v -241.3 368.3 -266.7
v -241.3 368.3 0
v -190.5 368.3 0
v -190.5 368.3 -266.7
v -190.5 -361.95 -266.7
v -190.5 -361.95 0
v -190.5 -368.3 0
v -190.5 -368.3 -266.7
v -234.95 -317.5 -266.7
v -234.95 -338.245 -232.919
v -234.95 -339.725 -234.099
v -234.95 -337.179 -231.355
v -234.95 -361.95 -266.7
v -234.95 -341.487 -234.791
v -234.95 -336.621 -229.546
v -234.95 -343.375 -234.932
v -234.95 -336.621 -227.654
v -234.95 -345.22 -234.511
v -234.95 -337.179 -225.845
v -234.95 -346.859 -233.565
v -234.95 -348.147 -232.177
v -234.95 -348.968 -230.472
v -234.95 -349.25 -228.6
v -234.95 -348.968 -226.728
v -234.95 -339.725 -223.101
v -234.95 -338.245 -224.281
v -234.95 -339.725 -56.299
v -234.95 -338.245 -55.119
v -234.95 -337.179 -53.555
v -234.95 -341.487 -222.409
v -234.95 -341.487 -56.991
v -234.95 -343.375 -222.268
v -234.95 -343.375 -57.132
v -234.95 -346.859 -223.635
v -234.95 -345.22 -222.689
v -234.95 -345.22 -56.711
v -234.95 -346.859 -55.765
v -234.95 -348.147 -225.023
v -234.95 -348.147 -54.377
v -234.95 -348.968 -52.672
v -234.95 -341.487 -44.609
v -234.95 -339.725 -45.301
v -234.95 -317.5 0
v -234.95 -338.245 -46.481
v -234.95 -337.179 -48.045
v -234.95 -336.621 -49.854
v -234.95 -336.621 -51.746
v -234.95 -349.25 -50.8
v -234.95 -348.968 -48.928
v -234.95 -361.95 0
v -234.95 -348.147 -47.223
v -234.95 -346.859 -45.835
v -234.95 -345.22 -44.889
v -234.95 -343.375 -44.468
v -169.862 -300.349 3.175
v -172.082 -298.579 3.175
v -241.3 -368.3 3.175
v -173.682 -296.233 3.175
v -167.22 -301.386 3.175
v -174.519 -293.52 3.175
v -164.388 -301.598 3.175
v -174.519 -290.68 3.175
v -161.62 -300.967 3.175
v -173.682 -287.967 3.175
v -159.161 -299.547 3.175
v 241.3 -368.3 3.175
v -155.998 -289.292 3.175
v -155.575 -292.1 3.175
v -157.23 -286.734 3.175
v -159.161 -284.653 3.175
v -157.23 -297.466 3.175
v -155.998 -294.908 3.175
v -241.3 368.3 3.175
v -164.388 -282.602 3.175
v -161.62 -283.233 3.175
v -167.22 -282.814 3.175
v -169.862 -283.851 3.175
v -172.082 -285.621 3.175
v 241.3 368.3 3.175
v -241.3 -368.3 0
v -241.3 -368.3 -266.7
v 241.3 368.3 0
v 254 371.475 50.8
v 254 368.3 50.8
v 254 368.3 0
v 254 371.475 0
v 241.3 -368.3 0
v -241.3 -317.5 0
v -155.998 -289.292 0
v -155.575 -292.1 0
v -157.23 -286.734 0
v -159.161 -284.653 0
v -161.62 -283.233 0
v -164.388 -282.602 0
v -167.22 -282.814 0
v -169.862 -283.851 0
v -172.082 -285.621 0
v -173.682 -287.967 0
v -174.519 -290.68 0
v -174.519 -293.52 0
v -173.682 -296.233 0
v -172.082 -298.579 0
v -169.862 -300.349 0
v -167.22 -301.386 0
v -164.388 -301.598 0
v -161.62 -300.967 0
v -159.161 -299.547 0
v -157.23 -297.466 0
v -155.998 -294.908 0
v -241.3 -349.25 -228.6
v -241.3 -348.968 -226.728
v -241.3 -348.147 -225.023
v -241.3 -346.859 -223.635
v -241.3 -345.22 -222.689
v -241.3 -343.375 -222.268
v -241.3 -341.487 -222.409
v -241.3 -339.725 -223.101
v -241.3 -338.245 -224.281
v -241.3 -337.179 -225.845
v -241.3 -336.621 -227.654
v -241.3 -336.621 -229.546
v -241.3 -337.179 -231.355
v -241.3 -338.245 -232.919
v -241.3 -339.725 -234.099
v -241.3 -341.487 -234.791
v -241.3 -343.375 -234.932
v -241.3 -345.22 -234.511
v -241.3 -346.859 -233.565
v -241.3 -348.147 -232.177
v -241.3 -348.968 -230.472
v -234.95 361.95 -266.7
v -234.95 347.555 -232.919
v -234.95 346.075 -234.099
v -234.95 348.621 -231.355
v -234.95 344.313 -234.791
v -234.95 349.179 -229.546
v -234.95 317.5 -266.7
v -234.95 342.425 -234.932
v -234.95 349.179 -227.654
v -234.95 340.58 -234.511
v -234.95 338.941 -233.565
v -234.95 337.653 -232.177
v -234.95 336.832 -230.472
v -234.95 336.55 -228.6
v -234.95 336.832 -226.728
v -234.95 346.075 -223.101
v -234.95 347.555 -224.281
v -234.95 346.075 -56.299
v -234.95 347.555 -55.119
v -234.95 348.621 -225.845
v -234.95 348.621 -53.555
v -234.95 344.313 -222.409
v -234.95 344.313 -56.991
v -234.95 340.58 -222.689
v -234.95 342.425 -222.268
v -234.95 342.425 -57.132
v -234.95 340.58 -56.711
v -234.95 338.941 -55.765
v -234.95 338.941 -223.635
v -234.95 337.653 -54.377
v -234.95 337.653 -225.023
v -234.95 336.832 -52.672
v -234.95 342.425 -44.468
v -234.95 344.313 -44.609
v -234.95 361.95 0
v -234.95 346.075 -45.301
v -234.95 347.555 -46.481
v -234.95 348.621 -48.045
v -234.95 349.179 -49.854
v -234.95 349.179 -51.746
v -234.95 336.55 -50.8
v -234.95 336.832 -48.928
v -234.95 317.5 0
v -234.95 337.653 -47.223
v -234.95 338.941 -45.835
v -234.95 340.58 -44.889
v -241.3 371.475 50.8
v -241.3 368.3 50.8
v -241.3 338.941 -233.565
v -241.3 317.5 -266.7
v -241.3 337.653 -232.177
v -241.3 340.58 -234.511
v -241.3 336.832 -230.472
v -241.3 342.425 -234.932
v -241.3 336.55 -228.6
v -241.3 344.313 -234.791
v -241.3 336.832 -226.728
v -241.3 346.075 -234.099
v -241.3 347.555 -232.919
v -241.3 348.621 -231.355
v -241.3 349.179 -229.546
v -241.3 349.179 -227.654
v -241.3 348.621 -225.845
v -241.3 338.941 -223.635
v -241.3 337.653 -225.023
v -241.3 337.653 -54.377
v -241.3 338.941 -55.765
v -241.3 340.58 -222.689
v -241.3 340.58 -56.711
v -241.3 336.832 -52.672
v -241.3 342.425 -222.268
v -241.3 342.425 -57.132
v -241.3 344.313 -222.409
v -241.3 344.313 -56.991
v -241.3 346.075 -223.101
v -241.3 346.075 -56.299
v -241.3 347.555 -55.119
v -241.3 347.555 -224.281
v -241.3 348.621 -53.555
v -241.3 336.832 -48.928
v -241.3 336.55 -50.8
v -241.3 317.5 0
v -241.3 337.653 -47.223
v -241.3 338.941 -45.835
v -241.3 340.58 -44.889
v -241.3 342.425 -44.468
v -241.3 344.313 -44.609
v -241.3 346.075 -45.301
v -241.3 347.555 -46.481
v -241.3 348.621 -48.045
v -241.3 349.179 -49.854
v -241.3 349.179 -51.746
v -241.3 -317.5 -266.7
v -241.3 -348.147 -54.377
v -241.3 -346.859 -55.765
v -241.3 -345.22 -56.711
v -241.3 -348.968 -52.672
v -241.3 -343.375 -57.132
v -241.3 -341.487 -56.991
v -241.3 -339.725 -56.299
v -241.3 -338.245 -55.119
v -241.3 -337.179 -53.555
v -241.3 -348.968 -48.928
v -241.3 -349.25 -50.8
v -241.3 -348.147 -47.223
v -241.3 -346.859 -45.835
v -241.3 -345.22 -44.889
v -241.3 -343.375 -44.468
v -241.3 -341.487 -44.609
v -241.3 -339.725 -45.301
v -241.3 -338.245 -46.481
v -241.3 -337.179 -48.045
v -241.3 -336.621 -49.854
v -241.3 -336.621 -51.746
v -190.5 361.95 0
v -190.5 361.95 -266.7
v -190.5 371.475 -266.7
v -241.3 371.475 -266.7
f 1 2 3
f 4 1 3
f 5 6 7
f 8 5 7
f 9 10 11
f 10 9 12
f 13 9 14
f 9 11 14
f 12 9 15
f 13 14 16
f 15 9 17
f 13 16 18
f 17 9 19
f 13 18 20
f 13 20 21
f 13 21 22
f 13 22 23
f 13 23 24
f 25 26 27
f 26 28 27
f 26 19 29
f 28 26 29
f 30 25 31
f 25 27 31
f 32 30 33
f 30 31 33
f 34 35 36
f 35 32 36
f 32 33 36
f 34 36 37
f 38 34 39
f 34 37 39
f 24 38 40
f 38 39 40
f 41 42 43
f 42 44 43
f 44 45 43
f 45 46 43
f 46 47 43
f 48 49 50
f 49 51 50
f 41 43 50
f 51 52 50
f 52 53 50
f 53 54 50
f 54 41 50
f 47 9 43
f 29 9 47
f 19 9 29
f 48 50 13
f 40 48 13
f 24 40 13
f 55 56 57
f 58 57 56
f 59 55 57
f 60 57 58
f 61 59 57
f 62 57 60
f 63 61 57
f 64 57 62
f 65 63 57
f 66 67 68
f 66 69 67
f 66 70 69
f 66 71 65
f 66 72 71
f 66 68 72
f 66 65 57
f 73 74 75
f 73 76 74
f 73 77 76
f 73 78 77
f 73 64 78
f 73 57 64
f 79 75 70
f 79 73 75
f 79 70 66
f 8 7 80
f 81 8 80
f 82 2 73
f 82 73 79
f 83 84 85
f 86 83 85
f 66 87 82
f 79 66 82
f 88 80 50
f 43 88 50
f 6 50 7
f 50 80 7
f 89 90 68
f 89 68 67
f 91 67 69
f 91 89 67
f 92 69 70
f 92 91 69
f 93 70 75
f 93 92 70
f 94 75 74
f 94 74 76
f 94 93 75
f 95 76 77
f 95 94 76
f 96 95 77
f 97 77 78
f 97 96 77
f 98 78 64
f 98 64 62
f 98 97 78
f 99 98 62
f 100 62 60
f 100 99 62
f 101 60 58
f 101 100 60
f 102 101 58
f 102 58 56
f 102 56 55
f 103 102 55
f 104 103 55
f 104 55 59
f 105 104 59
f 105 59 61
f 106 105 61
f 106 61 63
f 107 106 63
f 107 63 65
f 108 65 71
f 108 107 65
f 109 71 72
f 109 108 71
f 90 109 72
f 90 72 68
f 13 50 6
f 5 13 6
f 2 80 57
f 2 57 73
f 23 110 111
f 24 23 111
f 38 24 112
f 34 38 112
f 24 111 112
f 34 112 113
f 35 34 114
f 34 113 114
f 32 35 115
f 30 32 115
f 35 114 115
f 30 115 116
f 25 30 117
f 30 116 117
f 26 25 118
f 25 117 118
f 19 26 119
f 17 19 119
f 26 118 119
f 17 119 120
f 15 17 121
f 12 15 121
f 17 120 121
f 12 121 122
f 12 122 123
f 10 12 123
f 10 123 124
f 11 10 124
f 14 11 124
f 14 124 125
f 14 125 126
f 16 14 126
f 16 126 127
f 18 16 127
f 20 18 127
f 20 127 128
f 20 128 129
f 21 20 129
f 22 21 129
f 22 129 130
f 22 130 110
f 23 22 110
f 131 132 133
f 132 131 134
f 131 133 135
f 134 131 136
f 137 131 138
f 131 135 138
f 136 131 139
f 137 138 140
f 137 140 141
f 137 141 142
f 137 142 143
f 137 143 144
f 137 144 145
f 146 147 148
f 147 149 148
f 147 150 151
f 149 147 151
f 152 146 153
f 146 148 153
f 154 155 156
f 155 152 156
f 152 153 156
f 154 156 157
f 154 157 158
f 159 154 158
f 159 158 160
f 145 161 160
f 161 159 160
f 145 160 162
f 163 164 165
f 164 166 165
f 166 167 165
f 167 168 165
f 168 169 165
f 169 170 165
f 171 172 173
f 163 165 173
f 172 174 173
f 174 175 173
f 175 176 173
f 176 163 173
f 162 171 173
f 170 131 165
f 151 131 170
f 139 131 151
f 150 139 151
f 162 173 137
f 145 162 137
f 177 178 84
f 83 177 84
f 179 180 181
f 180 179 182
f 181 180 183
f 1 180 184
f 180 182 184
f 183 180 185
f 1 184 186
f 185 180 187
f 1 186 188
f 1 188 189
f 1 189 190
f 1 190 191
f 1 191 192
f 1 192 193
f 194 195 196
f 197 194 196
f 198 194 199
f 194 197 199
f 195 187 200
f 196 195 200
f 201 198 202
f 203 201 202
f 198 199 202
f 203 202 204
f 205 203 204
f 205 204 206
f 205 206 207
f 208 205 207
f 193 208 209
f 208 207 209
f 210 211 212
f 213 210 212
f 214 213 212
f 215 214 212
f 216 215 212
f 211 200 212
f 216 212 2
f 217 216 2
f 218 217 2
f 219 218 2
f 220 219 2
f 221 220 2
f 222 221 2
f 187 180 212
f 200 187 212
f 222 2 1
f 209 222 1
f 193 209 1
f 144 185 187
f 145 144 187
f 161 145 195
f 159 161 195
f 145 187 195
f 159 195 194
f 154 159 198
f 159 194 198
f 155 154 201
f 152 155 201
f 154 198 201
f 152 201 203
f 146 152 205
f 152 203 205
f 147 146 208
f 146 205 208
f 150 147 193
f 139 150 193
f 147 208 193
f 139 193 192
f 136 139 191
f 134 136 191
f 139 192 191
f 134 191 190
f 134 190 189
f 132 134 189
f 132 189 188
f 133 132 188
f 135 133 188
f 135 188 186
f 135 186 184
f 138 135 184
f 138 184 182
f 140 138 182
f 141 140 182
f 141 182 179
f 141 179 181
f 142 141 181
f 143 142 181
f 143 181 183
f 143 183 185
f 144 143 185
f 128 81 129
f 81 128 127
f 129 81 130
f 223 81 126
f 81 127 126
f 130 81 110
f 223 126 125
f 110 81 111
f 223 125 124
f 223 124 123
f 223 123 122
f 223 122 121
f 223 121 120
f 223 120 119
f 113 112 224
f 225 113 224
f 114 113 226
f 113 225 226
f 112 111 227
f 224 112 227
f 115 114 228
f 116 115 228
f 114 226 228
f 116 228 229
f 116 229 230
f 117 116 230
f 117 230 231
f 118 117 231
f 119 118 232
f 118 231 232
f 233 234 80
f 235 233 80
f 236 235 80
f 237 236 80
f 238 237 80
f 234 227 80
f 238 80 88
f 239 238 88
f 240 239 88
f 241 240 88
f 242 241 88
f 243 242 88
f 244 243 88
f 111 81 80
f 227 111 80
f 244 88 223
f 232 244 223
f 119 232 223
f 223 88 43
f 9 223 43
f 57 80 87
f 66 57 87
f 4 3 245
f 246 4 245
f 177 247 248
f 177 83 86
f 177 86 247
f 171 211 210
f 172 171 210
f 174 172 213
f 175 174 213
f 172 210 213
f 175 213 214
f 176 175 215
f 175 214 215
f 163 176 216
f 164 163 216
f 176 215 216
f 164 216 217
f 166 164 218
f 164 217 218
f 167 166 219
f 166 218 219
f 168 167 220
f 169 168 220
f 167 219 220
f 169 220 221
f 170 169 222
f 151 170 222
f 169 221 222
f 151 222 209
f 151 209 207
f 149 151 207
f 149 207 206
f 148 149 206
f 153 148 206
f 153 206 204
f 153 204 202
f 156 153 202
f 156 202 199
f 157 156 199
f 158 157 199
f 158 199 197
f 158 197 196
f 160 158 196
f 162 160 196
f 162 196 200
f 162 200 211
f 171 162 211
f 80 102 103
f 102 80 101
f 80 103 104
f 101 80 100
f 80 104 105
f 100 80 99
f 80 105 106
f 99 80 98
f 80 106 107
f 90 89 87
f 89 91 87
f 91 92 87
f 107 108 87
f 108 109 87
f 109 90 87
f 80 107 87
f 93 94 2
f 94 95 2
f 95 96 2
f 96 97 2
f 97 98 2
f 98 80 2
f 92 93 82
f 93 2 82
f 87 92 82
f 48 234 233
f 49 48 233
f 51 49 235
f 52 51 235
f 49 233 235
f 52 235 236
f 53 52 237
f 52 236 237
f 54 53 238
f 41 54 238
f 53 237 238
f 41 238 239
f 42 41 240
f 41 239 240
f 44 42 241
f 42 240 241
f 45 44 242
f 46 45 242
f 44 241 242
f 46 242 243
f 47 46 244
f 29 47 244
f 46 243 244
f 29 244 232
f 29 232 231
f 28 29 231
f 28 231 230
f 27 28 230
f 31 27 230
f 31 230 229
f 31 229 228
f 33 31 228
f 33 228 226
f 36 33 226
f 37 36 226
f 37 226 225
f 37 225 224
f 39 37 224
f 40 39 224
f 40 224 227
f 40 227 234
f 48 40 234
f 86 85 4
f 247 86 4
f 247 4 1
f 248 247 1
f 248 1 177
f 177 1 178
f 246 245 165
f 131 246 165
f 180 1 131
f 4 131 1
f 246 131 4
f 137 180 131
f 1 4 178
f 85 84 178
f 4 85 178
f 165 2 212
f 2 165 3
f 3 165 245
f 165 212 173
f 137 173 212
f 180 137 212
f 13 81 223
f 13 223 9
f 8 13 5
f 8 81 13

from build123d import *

# Parameters (mm, degrees)
F0_W     = 482.6
F0_H     = 736.6
F0_R     = 9.525
F1_DEPTH = 3.175
F3_DEPTH = 266.7
F5_DEPTH = 3.175
F6_R     = 6.35
F7_DEPTH = 25.4


with BuildPart() as f1:
    # F0 (on Top) → F1 (new body)
    with BuildSketch(Plane.XY):
        Rectangle(F0_W, F0_H)
        with Locations((-165.1, -292.1)):
            Circle(F0_R, mode=Mode.SUBTRACT)
    extrude(amount=F1_DEPTH)


with BuildPart() as f3:
    # F2 (on face) → F3 (new body)
    with BuildSketch(Plane(origin=(0, 0, 0), x_dir=(1, 0, 0), z_dir=(0, 0, -1))):
        Polygon((-241.3, -317.5), (-241.3, -368.3), (-190.5, -368.3), (-190.5, -361.95), (-234.95, -361.95), (-234.95, -317.5), align=None)
        Polygon((-190.5, 368.3), (-241.3, 368.3), (-241.3, 317.5), (-234.95, 317.5), (-234.95, 361.95), (-190.5, 361.95), align=None)
    extrude(amount=F3_DEPTH)

    # F6 (on face) → F7 (cut)
    with BuildSketch(Plane(origin=(-241.3, 0, 0), x_dir=(0, -1, 0), z_dir=(-1, 0, 0))):
        with Locations((-342.9, -50.8)):
            Circle(F6_R)
        with Locations((-342.9, -228.6)):
            Circle(F6_R)
        with Locations((342.9, -228.6)):
            Circle(F6_R)
        with Locations((342.9, -50.8)):
            Circle(F6_R)
    extrude(amount=-F7_DEPTH, mode=Mode.SUBTRACT)


with BuildPart() as f5:
    # F4 (on face) → F5 (new body)
    with BuildSketch(Plane(origin=(0, 368.3, 0), x_dir=(-1, 0, 0), z_dir=(0, 1, 0))):
        Polygon((190.5, -266.7), (241.3, -266.7), (241.3, 50.8), (-254, 50.8), (-254, 0), align=None)
    extrude(amount=F5_DEPTH)


solid = Compound([f1.part, f3.part, f5.part])
